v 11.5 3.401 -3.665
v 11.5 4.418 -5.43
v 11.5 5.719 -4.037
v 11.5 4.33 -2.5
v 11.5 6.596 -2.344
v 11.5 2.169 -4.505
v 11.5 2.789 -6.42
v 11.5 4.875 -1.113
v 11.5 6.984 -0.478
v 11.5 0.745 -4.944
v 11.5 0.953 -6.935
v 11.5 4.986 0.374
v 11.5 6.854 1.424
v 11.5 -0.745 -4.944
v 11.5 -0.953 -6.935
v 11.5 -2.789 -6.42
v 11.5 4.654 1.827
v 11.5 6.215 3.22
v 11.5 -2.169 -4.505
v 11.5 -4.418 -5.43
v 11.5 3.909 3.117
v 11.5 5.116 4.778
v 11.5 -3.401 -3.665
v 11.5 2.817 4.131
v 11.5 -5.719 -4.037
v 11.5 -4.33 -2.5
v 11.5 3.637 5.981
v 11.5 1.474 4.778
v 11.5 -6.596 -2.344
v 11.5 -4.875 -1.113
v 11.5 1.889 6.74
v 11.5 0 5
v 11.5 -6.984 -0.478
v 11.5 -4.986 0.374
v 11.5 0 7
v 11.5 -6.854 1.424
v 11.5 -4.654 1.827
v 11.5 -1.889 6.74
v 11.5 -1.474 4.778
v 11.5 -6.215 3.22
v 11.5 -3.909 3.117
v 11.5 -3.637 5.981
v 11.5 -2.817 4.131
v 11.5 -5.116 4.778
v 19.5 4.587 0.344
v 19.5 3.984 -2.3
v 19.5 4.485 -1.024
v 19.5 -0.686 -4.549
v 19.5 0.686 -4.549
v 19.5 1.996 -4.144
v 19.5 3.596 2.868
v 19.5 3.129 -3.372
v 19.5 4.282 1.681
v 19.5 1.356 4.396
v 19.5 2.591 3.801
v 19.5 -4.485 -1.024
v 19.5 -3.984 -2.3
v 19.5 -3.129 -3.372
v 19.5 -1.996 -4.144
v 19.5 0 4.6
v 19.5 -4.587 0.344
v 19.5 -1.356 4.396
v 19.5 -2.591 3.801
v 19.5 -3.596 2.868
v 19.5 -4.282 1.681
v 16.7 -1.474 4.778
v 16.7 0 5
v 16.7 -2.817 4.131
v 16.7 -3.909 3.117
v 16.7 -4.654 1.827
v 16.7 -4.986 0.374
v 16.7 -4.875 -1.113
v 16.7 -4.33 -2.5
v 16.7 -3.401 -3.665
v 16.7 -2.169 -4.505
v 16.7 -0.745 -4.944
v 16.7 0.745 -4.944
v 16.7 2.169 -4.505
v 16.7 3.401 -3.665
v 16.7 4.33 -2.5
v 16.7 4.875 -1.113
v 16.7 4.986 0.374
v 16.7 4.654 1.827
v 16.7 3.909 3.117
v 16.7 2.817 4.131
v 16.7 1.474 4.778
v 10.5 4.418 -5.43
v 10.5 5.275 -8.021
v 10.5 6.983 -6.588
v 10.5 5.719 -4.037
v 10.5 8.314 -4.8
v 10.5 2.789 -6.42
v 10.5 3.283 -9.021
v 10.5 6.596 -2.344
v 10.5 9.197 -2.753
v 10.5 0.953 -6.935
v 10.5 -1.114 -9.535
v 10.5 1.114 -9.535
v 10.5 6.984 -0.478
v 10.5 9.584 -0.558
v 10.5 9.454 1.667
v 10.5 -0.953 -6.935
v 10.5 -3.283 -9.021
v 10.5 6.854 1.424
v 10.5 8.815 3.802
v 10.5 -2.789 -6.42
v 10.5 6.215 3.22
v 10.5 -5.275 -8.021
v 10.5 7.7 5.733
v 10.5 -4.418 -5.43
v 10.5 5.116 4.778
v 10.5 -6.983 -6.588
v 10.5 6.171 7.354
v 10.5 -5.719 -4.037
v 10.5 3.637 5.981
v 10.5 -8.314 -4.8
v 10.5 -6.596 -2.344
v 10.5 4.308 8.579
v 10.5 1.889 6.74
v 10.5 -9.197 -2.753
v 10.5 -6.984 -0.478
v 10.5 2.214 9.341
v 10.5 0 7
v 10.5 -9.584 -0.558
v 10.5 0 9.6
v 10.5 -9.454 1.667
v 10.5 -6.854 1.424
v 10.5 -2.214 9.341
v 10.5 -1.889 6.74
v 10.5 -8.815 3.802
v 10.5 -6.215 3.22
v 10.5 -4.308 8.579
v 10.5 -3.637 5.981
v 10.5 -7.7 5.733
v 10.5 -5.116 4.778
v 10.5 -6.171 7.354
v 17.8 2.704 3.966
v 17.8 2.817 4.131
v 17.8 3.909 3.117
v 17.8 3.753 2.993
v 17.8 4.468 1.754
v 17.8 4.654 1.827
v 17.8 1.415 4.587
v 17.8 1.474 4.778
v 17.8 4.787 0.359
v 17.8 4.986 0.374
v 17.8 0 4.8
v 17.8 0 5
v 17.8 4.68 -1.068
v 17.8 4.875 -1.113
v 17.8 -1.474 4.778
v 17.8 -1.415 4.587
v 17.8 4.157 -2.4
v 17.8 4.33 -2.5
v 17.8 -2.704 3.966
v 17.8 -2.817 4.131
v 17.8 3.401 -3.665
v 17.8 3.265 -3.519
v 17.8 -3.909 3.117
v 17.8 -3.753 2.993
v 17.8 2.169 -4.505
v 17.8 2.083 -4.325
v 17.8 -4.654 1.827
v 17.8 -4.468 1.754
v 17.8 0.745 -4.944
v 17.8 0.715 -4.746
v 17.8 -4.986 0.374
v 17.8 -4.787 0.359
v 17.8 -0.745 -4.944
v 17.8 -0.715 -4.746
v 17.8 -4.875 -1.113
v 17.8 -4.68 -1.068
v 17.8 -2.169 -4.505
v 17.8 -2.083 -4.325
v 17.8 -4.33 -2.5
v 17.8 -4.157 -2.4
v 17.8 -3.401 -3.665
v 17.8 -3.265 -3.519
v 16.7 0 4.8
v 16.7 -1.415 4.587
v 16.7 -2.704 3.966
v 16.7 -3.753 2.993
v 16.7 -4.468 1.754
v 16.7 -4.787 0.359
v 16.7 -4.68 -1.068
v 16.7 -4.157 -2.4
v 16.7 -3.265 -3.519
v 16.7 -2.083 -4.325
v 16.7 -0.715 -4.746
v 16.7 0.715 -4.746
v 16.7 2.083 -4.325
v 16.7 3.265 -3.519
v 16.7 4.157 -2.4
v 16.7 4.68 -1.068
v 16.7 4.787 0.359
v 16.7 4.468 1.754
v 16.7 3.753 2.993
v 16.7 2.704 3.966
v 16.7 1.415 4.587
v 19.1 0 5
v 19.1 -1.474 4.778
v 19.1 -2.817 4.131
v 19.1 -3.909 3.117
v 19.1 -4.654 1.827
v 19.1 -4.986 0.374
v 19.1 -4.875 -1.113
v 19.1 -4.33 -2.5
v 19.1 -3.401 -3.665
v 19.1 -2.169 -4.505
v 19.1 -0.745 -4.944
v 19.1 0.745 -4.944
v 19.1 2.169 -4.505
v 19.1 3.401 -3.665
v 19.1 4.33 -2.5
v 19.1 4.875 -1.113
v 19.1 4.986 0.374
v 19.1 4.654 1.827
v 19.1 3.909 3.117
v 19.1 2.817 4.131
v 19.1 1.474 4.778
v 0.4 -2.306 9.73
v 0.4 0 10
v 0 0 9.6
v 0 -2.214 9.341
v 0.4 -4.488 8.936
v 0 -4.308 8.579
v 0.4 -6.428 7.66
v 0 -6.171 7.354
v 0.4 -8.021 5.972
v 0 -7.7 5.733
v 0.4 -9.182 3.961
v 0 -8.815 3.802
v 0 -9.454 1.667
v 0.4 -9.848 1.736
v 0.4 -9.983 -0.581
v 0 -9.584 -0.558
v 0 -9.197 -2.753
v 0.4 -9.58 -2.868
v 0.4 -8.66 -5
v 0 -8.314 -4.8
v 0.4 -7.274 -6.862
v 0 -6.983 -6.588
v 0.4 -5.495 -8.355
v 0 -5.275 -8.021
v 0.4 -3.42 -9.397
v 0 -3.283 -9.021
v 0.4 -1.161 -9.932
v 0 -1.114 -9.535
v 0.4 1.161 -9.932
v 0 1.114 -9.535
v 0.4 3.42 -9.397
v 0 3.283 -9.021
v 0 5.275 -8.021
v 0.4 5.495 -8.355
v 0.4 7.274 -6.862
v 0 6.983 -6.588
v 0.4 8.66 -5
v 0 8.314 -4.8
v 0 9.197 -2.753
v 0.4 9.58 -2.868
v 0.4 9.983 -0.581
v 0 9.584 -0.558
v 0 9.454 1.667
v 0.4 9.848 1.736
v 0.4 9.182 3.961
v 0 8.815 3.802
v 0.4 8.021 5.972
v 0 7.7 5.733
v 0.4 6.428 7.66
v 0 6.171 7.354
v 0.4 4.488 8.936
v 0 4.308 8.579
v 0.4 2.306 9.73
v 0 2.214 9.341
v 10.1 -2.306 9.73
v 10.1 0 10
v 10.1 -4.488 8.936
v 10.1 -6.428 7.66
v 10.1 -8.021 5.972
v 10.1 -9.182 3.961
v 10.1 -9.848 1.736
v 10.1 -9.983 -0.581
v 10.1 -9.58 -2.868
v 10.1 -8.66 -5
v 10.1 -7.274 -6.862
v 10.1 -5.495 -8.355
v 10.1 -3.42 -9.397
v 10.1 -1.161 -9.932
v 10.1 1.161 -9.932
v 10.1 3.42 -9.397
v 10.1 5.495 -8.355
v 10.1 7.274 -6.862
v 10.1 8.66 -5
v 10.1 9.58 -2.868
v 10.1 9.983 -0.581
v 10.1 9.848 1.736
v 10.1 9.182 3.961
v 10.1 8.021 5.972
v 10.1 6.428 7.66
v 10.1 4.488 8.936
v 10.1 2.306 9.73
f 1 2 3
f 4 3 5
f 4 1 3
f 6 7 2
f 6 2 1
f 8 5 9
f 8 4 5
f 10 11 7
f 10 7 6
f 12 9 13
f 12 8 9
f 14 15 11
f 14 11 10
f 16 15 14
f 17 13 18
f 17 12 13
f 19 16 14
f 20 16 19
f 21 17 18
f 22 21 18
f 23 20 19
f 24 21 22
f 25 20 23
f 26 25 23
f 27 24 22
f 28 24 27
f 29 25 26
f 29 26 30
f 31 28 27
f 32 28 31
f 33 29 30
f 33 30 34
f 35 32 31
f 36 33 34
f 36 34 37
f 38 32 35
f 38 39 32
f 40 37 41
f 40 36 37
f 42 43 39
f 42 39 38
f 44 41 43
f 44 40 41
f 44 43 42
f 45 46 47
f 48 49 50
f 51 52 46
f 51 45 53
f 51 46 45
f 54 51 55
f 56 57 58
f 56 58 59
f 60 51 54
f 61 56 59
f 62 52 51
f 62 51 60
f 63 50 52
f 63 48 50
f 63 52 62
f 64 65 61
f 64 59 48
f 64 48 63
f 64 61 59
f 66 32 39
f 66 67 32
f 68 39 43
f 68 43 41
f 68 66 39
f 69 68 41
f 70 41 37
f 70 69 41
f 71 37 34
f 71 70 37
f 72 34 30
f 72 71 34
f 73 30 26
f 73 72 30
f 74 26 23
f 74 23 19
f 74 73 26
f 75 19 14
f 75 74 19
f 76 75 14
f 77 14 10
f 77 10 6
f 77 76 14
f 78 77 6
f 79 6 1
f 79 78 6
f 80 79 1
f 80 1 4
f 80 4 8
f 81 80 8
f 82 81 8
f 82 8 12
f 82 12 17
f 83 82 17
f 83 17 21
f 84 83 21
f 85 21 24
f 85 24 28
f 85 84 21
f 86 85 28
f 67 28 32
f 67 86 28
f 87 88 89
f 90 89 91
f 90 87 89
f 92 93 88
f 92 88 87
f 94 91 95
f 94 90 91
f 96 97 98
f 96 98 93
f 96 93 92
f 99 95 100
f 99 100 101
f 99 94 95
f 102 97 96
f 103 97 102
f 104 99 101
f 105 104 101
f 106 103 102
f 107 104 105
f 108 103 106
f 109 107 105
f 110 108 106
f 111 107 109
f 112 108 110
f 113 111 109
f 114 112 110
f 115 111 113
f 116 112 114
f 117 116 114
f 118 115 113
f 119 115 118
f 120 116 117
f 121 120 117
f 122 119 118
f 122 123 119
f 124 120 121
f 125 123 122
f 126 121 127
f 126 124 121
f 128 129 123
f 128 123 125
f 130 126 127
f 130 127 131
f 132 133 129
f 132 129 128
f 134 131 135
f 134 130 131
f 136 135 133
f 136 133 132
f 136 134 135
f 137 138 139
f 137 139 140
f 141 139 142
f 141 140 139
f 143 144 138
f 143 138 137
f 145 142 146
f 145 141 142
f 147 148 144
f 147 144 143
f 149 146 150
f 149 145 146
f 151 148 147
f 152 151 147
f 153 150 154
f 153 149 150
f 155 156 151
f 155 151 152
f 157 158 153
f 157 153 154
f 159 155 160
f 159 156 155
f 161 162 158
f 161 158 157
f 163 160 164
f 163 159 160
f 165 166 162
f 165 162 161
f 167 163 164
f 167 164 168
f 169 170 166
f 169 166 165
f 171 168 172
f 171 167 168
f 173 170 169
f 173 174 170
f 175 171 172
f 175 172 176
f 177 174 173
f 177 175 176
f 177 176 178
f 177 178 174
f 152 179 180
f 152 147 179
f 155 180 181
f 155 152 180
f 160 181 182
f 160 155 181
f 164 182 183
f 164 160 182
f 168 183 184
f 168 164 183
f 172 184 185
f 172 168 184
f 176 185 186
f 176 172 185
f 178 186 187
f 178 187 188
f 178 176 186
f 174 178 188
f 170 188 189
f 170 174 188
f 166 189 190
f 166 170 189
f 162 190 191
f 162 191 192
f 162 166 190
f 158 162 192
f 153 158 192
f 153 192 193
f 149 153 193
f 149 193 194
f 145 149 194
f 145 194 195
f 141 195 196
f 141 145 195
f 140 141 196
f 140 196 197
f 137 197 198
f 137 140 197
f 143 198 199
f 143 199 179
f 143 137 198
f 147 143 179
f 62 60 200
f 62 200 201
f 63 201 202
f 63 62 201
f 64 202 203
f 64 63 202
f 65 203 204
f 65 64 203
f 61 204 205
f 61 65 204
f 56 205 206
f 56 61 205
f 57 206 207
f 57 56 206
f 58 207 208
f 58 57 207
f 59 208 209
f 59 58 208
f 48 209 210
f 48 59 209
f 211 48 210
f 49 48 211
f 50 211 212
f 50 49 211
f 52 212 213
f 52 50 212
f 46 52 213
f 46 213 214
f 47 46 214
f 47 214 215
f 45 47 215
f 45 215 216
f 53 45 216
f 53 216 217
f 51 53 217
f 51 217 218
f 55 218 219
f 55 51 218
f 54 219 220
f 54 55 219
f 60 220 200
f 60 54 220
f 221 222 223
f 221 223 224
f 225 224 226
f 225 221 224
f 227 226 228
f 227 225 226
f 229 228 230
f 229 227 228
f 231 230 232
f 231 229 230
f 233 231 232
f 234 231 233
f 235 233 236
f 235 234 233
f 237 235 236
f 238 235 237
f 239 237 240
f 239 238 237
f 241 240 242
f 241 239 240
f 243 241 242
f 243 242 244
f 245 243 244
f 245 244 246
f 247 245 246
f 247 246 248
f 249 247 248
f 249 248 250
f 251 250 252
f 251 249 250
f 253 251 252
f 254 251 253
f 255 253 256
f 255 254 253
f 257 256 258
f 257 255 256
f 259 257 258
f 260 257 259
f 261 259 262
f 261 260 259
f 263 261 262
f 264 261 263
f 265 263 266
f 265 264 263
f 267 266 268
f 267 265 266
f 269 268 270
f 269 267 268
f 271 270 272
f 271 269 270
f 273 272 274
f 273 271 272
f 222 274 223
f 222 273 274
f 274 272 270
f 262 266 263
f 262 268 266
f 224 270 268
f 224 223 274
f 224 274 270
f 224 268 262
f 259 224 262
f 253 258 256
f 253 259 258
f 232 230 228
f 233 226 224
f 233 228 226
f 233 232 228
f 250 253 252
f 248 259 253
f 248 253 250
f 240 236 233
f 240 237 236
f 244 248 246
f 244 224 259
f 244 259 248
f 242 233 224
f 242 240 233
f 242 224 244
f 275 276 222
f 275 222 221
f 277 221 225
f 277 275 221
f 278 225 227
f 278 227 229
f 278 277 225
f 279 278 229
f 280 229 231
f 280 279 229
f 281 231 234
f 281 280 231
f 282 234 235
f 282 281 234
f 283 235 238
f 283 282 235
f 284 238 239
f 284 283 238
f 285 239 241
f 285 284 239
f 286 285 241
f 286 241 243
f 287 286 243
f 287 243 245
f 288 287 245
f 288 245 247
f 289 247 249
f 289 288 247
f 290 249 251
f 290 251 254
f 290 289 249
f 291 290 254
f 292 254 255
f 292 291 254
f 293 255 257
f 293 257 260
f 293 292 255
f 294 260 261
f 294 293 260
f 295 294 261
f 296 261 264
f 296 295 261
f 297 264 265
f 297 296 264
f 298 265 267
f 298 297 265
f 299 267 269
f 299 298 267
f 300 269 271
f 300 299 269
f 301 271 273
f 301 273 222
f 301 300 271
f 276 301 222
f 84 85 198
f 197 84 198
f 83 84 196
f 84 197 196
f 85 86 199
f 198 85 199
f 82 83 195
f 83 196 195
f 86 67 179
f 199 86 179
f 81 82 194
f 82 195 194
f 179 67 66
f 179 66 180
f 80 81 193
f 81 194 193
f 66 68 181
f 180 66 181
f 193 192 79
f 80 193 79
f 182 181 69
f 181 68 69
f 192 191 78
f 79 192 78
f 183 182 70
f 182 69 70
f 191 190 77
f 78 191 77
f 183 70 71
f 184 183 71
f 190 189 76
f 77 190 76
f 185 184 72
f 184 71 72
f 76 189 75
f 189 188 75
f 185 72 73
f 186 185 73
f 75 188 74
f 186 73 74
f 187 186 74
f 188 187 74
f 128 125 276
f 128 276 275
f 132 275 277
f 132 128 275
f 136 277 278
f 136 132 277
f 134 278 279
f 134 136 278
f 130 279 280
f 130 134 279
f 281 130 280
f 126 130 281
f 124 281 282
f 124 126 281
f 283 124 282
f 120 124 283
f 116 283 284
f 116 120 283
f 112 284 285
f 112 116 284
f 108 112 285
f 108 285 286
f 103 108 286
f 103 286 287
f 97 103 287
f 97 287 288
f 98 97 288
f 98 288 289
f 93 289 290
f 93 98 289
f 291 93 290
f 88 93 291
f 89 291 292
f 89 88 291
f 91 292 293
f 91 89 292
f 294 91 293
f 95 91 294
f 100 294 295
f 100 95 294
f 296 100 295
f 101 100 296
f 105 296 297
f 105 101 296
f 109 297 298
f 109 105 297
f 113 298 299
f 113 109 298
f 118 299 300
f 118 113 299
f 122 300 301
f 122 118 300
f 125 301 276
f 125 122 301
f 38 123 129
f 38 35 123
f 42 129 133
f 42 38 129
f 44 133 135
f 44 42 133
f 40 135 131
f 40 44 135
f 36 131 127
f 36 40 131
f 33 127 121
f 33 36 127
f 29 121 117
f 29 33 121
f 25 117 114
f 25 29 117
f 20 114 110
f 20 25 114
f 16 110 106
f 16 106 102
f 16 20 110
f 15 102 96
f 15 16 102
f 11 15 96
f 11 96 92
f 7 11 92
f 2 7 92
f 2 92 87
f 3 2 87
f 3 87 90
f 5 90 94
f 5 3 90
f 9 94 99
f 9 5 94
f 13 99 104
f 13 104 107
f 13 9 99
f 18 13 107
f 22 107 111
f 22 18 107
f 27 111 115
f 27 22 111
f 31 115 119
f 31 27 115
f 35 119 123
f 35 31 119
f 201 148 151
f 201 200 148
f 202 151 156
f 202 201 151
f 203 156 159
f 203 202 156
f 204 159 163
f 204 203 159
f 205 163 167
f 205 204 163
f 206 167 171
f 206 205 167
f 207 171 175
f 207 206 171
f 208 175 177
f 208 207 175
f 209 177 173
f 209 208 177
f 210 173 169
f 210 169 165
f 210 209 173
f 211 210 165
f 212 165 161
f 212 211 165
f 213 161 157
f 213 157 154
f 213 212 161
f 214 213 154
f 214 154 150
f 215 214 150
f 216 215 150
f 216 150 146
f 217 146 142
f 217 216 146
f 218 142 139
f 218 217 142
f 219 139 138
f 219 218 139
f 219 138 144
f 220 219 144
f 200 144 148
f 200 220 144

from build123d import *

# Parameters (mm, degrees)
CHAMFER1_SIZE = 0.4
SKETCH2_W     = 1.1
SKETCH2_H     = 0.2


with BuildPart() as part:
    # Sketch1 → Revolve1 (revolve)
    with BuildSketch(Plane(origin=(0, 0, 0), x_dir=(1, 0, 0), z_dir=(0, 1, 0)), mode=Mode.PRIVATE) as revolve1_sk:
        Polygon((0, 0), (0, 10), (10.5, 10), (10.5, 7), (11.5, 7), (11.5, 5), (19.5, 5), (19.5, 0), align=None)
    revolve(revolve1_sk.sketch.rotate(Axis((0, 0, 0), (1, 0, 0)), 180), axis=Axis((0, 0, 0), (1, 0, 0)))

    # Chamfer1
    chamfer1_edges = [part.edges().sort_by_distance(p)[0] for p in [
        (19.5, 0, -5),
        (10.5, 0, -10),
        (0, 0, -10),
    ]]
    chamfer(chamfer1_edges, length=CHAMFER1_SIZE)

    # Sketch2 → Cut-Revolve1 (revolve, cut)
    with BuildSketch(Plane(origin=(0, 0, 0), x_dir=(1, 0, 0), z_dir=(0, 1, 0)), mode=Mode.PRIVATE) as cut_revolve1_sk:
        with Locations((17.25, 4.9)):
            Rectangle(SKETCH2_W, SKETCH2_H)
    revolve(cut_revolve1_sk.sketch.rotate(Axis((11.5, 0, 0), (1, 0, 0)), 180), axis=Axis((11.5, 0, 0), (1, 0, 0)), mode=Mode.SUBTRACT)


solid = part.part
